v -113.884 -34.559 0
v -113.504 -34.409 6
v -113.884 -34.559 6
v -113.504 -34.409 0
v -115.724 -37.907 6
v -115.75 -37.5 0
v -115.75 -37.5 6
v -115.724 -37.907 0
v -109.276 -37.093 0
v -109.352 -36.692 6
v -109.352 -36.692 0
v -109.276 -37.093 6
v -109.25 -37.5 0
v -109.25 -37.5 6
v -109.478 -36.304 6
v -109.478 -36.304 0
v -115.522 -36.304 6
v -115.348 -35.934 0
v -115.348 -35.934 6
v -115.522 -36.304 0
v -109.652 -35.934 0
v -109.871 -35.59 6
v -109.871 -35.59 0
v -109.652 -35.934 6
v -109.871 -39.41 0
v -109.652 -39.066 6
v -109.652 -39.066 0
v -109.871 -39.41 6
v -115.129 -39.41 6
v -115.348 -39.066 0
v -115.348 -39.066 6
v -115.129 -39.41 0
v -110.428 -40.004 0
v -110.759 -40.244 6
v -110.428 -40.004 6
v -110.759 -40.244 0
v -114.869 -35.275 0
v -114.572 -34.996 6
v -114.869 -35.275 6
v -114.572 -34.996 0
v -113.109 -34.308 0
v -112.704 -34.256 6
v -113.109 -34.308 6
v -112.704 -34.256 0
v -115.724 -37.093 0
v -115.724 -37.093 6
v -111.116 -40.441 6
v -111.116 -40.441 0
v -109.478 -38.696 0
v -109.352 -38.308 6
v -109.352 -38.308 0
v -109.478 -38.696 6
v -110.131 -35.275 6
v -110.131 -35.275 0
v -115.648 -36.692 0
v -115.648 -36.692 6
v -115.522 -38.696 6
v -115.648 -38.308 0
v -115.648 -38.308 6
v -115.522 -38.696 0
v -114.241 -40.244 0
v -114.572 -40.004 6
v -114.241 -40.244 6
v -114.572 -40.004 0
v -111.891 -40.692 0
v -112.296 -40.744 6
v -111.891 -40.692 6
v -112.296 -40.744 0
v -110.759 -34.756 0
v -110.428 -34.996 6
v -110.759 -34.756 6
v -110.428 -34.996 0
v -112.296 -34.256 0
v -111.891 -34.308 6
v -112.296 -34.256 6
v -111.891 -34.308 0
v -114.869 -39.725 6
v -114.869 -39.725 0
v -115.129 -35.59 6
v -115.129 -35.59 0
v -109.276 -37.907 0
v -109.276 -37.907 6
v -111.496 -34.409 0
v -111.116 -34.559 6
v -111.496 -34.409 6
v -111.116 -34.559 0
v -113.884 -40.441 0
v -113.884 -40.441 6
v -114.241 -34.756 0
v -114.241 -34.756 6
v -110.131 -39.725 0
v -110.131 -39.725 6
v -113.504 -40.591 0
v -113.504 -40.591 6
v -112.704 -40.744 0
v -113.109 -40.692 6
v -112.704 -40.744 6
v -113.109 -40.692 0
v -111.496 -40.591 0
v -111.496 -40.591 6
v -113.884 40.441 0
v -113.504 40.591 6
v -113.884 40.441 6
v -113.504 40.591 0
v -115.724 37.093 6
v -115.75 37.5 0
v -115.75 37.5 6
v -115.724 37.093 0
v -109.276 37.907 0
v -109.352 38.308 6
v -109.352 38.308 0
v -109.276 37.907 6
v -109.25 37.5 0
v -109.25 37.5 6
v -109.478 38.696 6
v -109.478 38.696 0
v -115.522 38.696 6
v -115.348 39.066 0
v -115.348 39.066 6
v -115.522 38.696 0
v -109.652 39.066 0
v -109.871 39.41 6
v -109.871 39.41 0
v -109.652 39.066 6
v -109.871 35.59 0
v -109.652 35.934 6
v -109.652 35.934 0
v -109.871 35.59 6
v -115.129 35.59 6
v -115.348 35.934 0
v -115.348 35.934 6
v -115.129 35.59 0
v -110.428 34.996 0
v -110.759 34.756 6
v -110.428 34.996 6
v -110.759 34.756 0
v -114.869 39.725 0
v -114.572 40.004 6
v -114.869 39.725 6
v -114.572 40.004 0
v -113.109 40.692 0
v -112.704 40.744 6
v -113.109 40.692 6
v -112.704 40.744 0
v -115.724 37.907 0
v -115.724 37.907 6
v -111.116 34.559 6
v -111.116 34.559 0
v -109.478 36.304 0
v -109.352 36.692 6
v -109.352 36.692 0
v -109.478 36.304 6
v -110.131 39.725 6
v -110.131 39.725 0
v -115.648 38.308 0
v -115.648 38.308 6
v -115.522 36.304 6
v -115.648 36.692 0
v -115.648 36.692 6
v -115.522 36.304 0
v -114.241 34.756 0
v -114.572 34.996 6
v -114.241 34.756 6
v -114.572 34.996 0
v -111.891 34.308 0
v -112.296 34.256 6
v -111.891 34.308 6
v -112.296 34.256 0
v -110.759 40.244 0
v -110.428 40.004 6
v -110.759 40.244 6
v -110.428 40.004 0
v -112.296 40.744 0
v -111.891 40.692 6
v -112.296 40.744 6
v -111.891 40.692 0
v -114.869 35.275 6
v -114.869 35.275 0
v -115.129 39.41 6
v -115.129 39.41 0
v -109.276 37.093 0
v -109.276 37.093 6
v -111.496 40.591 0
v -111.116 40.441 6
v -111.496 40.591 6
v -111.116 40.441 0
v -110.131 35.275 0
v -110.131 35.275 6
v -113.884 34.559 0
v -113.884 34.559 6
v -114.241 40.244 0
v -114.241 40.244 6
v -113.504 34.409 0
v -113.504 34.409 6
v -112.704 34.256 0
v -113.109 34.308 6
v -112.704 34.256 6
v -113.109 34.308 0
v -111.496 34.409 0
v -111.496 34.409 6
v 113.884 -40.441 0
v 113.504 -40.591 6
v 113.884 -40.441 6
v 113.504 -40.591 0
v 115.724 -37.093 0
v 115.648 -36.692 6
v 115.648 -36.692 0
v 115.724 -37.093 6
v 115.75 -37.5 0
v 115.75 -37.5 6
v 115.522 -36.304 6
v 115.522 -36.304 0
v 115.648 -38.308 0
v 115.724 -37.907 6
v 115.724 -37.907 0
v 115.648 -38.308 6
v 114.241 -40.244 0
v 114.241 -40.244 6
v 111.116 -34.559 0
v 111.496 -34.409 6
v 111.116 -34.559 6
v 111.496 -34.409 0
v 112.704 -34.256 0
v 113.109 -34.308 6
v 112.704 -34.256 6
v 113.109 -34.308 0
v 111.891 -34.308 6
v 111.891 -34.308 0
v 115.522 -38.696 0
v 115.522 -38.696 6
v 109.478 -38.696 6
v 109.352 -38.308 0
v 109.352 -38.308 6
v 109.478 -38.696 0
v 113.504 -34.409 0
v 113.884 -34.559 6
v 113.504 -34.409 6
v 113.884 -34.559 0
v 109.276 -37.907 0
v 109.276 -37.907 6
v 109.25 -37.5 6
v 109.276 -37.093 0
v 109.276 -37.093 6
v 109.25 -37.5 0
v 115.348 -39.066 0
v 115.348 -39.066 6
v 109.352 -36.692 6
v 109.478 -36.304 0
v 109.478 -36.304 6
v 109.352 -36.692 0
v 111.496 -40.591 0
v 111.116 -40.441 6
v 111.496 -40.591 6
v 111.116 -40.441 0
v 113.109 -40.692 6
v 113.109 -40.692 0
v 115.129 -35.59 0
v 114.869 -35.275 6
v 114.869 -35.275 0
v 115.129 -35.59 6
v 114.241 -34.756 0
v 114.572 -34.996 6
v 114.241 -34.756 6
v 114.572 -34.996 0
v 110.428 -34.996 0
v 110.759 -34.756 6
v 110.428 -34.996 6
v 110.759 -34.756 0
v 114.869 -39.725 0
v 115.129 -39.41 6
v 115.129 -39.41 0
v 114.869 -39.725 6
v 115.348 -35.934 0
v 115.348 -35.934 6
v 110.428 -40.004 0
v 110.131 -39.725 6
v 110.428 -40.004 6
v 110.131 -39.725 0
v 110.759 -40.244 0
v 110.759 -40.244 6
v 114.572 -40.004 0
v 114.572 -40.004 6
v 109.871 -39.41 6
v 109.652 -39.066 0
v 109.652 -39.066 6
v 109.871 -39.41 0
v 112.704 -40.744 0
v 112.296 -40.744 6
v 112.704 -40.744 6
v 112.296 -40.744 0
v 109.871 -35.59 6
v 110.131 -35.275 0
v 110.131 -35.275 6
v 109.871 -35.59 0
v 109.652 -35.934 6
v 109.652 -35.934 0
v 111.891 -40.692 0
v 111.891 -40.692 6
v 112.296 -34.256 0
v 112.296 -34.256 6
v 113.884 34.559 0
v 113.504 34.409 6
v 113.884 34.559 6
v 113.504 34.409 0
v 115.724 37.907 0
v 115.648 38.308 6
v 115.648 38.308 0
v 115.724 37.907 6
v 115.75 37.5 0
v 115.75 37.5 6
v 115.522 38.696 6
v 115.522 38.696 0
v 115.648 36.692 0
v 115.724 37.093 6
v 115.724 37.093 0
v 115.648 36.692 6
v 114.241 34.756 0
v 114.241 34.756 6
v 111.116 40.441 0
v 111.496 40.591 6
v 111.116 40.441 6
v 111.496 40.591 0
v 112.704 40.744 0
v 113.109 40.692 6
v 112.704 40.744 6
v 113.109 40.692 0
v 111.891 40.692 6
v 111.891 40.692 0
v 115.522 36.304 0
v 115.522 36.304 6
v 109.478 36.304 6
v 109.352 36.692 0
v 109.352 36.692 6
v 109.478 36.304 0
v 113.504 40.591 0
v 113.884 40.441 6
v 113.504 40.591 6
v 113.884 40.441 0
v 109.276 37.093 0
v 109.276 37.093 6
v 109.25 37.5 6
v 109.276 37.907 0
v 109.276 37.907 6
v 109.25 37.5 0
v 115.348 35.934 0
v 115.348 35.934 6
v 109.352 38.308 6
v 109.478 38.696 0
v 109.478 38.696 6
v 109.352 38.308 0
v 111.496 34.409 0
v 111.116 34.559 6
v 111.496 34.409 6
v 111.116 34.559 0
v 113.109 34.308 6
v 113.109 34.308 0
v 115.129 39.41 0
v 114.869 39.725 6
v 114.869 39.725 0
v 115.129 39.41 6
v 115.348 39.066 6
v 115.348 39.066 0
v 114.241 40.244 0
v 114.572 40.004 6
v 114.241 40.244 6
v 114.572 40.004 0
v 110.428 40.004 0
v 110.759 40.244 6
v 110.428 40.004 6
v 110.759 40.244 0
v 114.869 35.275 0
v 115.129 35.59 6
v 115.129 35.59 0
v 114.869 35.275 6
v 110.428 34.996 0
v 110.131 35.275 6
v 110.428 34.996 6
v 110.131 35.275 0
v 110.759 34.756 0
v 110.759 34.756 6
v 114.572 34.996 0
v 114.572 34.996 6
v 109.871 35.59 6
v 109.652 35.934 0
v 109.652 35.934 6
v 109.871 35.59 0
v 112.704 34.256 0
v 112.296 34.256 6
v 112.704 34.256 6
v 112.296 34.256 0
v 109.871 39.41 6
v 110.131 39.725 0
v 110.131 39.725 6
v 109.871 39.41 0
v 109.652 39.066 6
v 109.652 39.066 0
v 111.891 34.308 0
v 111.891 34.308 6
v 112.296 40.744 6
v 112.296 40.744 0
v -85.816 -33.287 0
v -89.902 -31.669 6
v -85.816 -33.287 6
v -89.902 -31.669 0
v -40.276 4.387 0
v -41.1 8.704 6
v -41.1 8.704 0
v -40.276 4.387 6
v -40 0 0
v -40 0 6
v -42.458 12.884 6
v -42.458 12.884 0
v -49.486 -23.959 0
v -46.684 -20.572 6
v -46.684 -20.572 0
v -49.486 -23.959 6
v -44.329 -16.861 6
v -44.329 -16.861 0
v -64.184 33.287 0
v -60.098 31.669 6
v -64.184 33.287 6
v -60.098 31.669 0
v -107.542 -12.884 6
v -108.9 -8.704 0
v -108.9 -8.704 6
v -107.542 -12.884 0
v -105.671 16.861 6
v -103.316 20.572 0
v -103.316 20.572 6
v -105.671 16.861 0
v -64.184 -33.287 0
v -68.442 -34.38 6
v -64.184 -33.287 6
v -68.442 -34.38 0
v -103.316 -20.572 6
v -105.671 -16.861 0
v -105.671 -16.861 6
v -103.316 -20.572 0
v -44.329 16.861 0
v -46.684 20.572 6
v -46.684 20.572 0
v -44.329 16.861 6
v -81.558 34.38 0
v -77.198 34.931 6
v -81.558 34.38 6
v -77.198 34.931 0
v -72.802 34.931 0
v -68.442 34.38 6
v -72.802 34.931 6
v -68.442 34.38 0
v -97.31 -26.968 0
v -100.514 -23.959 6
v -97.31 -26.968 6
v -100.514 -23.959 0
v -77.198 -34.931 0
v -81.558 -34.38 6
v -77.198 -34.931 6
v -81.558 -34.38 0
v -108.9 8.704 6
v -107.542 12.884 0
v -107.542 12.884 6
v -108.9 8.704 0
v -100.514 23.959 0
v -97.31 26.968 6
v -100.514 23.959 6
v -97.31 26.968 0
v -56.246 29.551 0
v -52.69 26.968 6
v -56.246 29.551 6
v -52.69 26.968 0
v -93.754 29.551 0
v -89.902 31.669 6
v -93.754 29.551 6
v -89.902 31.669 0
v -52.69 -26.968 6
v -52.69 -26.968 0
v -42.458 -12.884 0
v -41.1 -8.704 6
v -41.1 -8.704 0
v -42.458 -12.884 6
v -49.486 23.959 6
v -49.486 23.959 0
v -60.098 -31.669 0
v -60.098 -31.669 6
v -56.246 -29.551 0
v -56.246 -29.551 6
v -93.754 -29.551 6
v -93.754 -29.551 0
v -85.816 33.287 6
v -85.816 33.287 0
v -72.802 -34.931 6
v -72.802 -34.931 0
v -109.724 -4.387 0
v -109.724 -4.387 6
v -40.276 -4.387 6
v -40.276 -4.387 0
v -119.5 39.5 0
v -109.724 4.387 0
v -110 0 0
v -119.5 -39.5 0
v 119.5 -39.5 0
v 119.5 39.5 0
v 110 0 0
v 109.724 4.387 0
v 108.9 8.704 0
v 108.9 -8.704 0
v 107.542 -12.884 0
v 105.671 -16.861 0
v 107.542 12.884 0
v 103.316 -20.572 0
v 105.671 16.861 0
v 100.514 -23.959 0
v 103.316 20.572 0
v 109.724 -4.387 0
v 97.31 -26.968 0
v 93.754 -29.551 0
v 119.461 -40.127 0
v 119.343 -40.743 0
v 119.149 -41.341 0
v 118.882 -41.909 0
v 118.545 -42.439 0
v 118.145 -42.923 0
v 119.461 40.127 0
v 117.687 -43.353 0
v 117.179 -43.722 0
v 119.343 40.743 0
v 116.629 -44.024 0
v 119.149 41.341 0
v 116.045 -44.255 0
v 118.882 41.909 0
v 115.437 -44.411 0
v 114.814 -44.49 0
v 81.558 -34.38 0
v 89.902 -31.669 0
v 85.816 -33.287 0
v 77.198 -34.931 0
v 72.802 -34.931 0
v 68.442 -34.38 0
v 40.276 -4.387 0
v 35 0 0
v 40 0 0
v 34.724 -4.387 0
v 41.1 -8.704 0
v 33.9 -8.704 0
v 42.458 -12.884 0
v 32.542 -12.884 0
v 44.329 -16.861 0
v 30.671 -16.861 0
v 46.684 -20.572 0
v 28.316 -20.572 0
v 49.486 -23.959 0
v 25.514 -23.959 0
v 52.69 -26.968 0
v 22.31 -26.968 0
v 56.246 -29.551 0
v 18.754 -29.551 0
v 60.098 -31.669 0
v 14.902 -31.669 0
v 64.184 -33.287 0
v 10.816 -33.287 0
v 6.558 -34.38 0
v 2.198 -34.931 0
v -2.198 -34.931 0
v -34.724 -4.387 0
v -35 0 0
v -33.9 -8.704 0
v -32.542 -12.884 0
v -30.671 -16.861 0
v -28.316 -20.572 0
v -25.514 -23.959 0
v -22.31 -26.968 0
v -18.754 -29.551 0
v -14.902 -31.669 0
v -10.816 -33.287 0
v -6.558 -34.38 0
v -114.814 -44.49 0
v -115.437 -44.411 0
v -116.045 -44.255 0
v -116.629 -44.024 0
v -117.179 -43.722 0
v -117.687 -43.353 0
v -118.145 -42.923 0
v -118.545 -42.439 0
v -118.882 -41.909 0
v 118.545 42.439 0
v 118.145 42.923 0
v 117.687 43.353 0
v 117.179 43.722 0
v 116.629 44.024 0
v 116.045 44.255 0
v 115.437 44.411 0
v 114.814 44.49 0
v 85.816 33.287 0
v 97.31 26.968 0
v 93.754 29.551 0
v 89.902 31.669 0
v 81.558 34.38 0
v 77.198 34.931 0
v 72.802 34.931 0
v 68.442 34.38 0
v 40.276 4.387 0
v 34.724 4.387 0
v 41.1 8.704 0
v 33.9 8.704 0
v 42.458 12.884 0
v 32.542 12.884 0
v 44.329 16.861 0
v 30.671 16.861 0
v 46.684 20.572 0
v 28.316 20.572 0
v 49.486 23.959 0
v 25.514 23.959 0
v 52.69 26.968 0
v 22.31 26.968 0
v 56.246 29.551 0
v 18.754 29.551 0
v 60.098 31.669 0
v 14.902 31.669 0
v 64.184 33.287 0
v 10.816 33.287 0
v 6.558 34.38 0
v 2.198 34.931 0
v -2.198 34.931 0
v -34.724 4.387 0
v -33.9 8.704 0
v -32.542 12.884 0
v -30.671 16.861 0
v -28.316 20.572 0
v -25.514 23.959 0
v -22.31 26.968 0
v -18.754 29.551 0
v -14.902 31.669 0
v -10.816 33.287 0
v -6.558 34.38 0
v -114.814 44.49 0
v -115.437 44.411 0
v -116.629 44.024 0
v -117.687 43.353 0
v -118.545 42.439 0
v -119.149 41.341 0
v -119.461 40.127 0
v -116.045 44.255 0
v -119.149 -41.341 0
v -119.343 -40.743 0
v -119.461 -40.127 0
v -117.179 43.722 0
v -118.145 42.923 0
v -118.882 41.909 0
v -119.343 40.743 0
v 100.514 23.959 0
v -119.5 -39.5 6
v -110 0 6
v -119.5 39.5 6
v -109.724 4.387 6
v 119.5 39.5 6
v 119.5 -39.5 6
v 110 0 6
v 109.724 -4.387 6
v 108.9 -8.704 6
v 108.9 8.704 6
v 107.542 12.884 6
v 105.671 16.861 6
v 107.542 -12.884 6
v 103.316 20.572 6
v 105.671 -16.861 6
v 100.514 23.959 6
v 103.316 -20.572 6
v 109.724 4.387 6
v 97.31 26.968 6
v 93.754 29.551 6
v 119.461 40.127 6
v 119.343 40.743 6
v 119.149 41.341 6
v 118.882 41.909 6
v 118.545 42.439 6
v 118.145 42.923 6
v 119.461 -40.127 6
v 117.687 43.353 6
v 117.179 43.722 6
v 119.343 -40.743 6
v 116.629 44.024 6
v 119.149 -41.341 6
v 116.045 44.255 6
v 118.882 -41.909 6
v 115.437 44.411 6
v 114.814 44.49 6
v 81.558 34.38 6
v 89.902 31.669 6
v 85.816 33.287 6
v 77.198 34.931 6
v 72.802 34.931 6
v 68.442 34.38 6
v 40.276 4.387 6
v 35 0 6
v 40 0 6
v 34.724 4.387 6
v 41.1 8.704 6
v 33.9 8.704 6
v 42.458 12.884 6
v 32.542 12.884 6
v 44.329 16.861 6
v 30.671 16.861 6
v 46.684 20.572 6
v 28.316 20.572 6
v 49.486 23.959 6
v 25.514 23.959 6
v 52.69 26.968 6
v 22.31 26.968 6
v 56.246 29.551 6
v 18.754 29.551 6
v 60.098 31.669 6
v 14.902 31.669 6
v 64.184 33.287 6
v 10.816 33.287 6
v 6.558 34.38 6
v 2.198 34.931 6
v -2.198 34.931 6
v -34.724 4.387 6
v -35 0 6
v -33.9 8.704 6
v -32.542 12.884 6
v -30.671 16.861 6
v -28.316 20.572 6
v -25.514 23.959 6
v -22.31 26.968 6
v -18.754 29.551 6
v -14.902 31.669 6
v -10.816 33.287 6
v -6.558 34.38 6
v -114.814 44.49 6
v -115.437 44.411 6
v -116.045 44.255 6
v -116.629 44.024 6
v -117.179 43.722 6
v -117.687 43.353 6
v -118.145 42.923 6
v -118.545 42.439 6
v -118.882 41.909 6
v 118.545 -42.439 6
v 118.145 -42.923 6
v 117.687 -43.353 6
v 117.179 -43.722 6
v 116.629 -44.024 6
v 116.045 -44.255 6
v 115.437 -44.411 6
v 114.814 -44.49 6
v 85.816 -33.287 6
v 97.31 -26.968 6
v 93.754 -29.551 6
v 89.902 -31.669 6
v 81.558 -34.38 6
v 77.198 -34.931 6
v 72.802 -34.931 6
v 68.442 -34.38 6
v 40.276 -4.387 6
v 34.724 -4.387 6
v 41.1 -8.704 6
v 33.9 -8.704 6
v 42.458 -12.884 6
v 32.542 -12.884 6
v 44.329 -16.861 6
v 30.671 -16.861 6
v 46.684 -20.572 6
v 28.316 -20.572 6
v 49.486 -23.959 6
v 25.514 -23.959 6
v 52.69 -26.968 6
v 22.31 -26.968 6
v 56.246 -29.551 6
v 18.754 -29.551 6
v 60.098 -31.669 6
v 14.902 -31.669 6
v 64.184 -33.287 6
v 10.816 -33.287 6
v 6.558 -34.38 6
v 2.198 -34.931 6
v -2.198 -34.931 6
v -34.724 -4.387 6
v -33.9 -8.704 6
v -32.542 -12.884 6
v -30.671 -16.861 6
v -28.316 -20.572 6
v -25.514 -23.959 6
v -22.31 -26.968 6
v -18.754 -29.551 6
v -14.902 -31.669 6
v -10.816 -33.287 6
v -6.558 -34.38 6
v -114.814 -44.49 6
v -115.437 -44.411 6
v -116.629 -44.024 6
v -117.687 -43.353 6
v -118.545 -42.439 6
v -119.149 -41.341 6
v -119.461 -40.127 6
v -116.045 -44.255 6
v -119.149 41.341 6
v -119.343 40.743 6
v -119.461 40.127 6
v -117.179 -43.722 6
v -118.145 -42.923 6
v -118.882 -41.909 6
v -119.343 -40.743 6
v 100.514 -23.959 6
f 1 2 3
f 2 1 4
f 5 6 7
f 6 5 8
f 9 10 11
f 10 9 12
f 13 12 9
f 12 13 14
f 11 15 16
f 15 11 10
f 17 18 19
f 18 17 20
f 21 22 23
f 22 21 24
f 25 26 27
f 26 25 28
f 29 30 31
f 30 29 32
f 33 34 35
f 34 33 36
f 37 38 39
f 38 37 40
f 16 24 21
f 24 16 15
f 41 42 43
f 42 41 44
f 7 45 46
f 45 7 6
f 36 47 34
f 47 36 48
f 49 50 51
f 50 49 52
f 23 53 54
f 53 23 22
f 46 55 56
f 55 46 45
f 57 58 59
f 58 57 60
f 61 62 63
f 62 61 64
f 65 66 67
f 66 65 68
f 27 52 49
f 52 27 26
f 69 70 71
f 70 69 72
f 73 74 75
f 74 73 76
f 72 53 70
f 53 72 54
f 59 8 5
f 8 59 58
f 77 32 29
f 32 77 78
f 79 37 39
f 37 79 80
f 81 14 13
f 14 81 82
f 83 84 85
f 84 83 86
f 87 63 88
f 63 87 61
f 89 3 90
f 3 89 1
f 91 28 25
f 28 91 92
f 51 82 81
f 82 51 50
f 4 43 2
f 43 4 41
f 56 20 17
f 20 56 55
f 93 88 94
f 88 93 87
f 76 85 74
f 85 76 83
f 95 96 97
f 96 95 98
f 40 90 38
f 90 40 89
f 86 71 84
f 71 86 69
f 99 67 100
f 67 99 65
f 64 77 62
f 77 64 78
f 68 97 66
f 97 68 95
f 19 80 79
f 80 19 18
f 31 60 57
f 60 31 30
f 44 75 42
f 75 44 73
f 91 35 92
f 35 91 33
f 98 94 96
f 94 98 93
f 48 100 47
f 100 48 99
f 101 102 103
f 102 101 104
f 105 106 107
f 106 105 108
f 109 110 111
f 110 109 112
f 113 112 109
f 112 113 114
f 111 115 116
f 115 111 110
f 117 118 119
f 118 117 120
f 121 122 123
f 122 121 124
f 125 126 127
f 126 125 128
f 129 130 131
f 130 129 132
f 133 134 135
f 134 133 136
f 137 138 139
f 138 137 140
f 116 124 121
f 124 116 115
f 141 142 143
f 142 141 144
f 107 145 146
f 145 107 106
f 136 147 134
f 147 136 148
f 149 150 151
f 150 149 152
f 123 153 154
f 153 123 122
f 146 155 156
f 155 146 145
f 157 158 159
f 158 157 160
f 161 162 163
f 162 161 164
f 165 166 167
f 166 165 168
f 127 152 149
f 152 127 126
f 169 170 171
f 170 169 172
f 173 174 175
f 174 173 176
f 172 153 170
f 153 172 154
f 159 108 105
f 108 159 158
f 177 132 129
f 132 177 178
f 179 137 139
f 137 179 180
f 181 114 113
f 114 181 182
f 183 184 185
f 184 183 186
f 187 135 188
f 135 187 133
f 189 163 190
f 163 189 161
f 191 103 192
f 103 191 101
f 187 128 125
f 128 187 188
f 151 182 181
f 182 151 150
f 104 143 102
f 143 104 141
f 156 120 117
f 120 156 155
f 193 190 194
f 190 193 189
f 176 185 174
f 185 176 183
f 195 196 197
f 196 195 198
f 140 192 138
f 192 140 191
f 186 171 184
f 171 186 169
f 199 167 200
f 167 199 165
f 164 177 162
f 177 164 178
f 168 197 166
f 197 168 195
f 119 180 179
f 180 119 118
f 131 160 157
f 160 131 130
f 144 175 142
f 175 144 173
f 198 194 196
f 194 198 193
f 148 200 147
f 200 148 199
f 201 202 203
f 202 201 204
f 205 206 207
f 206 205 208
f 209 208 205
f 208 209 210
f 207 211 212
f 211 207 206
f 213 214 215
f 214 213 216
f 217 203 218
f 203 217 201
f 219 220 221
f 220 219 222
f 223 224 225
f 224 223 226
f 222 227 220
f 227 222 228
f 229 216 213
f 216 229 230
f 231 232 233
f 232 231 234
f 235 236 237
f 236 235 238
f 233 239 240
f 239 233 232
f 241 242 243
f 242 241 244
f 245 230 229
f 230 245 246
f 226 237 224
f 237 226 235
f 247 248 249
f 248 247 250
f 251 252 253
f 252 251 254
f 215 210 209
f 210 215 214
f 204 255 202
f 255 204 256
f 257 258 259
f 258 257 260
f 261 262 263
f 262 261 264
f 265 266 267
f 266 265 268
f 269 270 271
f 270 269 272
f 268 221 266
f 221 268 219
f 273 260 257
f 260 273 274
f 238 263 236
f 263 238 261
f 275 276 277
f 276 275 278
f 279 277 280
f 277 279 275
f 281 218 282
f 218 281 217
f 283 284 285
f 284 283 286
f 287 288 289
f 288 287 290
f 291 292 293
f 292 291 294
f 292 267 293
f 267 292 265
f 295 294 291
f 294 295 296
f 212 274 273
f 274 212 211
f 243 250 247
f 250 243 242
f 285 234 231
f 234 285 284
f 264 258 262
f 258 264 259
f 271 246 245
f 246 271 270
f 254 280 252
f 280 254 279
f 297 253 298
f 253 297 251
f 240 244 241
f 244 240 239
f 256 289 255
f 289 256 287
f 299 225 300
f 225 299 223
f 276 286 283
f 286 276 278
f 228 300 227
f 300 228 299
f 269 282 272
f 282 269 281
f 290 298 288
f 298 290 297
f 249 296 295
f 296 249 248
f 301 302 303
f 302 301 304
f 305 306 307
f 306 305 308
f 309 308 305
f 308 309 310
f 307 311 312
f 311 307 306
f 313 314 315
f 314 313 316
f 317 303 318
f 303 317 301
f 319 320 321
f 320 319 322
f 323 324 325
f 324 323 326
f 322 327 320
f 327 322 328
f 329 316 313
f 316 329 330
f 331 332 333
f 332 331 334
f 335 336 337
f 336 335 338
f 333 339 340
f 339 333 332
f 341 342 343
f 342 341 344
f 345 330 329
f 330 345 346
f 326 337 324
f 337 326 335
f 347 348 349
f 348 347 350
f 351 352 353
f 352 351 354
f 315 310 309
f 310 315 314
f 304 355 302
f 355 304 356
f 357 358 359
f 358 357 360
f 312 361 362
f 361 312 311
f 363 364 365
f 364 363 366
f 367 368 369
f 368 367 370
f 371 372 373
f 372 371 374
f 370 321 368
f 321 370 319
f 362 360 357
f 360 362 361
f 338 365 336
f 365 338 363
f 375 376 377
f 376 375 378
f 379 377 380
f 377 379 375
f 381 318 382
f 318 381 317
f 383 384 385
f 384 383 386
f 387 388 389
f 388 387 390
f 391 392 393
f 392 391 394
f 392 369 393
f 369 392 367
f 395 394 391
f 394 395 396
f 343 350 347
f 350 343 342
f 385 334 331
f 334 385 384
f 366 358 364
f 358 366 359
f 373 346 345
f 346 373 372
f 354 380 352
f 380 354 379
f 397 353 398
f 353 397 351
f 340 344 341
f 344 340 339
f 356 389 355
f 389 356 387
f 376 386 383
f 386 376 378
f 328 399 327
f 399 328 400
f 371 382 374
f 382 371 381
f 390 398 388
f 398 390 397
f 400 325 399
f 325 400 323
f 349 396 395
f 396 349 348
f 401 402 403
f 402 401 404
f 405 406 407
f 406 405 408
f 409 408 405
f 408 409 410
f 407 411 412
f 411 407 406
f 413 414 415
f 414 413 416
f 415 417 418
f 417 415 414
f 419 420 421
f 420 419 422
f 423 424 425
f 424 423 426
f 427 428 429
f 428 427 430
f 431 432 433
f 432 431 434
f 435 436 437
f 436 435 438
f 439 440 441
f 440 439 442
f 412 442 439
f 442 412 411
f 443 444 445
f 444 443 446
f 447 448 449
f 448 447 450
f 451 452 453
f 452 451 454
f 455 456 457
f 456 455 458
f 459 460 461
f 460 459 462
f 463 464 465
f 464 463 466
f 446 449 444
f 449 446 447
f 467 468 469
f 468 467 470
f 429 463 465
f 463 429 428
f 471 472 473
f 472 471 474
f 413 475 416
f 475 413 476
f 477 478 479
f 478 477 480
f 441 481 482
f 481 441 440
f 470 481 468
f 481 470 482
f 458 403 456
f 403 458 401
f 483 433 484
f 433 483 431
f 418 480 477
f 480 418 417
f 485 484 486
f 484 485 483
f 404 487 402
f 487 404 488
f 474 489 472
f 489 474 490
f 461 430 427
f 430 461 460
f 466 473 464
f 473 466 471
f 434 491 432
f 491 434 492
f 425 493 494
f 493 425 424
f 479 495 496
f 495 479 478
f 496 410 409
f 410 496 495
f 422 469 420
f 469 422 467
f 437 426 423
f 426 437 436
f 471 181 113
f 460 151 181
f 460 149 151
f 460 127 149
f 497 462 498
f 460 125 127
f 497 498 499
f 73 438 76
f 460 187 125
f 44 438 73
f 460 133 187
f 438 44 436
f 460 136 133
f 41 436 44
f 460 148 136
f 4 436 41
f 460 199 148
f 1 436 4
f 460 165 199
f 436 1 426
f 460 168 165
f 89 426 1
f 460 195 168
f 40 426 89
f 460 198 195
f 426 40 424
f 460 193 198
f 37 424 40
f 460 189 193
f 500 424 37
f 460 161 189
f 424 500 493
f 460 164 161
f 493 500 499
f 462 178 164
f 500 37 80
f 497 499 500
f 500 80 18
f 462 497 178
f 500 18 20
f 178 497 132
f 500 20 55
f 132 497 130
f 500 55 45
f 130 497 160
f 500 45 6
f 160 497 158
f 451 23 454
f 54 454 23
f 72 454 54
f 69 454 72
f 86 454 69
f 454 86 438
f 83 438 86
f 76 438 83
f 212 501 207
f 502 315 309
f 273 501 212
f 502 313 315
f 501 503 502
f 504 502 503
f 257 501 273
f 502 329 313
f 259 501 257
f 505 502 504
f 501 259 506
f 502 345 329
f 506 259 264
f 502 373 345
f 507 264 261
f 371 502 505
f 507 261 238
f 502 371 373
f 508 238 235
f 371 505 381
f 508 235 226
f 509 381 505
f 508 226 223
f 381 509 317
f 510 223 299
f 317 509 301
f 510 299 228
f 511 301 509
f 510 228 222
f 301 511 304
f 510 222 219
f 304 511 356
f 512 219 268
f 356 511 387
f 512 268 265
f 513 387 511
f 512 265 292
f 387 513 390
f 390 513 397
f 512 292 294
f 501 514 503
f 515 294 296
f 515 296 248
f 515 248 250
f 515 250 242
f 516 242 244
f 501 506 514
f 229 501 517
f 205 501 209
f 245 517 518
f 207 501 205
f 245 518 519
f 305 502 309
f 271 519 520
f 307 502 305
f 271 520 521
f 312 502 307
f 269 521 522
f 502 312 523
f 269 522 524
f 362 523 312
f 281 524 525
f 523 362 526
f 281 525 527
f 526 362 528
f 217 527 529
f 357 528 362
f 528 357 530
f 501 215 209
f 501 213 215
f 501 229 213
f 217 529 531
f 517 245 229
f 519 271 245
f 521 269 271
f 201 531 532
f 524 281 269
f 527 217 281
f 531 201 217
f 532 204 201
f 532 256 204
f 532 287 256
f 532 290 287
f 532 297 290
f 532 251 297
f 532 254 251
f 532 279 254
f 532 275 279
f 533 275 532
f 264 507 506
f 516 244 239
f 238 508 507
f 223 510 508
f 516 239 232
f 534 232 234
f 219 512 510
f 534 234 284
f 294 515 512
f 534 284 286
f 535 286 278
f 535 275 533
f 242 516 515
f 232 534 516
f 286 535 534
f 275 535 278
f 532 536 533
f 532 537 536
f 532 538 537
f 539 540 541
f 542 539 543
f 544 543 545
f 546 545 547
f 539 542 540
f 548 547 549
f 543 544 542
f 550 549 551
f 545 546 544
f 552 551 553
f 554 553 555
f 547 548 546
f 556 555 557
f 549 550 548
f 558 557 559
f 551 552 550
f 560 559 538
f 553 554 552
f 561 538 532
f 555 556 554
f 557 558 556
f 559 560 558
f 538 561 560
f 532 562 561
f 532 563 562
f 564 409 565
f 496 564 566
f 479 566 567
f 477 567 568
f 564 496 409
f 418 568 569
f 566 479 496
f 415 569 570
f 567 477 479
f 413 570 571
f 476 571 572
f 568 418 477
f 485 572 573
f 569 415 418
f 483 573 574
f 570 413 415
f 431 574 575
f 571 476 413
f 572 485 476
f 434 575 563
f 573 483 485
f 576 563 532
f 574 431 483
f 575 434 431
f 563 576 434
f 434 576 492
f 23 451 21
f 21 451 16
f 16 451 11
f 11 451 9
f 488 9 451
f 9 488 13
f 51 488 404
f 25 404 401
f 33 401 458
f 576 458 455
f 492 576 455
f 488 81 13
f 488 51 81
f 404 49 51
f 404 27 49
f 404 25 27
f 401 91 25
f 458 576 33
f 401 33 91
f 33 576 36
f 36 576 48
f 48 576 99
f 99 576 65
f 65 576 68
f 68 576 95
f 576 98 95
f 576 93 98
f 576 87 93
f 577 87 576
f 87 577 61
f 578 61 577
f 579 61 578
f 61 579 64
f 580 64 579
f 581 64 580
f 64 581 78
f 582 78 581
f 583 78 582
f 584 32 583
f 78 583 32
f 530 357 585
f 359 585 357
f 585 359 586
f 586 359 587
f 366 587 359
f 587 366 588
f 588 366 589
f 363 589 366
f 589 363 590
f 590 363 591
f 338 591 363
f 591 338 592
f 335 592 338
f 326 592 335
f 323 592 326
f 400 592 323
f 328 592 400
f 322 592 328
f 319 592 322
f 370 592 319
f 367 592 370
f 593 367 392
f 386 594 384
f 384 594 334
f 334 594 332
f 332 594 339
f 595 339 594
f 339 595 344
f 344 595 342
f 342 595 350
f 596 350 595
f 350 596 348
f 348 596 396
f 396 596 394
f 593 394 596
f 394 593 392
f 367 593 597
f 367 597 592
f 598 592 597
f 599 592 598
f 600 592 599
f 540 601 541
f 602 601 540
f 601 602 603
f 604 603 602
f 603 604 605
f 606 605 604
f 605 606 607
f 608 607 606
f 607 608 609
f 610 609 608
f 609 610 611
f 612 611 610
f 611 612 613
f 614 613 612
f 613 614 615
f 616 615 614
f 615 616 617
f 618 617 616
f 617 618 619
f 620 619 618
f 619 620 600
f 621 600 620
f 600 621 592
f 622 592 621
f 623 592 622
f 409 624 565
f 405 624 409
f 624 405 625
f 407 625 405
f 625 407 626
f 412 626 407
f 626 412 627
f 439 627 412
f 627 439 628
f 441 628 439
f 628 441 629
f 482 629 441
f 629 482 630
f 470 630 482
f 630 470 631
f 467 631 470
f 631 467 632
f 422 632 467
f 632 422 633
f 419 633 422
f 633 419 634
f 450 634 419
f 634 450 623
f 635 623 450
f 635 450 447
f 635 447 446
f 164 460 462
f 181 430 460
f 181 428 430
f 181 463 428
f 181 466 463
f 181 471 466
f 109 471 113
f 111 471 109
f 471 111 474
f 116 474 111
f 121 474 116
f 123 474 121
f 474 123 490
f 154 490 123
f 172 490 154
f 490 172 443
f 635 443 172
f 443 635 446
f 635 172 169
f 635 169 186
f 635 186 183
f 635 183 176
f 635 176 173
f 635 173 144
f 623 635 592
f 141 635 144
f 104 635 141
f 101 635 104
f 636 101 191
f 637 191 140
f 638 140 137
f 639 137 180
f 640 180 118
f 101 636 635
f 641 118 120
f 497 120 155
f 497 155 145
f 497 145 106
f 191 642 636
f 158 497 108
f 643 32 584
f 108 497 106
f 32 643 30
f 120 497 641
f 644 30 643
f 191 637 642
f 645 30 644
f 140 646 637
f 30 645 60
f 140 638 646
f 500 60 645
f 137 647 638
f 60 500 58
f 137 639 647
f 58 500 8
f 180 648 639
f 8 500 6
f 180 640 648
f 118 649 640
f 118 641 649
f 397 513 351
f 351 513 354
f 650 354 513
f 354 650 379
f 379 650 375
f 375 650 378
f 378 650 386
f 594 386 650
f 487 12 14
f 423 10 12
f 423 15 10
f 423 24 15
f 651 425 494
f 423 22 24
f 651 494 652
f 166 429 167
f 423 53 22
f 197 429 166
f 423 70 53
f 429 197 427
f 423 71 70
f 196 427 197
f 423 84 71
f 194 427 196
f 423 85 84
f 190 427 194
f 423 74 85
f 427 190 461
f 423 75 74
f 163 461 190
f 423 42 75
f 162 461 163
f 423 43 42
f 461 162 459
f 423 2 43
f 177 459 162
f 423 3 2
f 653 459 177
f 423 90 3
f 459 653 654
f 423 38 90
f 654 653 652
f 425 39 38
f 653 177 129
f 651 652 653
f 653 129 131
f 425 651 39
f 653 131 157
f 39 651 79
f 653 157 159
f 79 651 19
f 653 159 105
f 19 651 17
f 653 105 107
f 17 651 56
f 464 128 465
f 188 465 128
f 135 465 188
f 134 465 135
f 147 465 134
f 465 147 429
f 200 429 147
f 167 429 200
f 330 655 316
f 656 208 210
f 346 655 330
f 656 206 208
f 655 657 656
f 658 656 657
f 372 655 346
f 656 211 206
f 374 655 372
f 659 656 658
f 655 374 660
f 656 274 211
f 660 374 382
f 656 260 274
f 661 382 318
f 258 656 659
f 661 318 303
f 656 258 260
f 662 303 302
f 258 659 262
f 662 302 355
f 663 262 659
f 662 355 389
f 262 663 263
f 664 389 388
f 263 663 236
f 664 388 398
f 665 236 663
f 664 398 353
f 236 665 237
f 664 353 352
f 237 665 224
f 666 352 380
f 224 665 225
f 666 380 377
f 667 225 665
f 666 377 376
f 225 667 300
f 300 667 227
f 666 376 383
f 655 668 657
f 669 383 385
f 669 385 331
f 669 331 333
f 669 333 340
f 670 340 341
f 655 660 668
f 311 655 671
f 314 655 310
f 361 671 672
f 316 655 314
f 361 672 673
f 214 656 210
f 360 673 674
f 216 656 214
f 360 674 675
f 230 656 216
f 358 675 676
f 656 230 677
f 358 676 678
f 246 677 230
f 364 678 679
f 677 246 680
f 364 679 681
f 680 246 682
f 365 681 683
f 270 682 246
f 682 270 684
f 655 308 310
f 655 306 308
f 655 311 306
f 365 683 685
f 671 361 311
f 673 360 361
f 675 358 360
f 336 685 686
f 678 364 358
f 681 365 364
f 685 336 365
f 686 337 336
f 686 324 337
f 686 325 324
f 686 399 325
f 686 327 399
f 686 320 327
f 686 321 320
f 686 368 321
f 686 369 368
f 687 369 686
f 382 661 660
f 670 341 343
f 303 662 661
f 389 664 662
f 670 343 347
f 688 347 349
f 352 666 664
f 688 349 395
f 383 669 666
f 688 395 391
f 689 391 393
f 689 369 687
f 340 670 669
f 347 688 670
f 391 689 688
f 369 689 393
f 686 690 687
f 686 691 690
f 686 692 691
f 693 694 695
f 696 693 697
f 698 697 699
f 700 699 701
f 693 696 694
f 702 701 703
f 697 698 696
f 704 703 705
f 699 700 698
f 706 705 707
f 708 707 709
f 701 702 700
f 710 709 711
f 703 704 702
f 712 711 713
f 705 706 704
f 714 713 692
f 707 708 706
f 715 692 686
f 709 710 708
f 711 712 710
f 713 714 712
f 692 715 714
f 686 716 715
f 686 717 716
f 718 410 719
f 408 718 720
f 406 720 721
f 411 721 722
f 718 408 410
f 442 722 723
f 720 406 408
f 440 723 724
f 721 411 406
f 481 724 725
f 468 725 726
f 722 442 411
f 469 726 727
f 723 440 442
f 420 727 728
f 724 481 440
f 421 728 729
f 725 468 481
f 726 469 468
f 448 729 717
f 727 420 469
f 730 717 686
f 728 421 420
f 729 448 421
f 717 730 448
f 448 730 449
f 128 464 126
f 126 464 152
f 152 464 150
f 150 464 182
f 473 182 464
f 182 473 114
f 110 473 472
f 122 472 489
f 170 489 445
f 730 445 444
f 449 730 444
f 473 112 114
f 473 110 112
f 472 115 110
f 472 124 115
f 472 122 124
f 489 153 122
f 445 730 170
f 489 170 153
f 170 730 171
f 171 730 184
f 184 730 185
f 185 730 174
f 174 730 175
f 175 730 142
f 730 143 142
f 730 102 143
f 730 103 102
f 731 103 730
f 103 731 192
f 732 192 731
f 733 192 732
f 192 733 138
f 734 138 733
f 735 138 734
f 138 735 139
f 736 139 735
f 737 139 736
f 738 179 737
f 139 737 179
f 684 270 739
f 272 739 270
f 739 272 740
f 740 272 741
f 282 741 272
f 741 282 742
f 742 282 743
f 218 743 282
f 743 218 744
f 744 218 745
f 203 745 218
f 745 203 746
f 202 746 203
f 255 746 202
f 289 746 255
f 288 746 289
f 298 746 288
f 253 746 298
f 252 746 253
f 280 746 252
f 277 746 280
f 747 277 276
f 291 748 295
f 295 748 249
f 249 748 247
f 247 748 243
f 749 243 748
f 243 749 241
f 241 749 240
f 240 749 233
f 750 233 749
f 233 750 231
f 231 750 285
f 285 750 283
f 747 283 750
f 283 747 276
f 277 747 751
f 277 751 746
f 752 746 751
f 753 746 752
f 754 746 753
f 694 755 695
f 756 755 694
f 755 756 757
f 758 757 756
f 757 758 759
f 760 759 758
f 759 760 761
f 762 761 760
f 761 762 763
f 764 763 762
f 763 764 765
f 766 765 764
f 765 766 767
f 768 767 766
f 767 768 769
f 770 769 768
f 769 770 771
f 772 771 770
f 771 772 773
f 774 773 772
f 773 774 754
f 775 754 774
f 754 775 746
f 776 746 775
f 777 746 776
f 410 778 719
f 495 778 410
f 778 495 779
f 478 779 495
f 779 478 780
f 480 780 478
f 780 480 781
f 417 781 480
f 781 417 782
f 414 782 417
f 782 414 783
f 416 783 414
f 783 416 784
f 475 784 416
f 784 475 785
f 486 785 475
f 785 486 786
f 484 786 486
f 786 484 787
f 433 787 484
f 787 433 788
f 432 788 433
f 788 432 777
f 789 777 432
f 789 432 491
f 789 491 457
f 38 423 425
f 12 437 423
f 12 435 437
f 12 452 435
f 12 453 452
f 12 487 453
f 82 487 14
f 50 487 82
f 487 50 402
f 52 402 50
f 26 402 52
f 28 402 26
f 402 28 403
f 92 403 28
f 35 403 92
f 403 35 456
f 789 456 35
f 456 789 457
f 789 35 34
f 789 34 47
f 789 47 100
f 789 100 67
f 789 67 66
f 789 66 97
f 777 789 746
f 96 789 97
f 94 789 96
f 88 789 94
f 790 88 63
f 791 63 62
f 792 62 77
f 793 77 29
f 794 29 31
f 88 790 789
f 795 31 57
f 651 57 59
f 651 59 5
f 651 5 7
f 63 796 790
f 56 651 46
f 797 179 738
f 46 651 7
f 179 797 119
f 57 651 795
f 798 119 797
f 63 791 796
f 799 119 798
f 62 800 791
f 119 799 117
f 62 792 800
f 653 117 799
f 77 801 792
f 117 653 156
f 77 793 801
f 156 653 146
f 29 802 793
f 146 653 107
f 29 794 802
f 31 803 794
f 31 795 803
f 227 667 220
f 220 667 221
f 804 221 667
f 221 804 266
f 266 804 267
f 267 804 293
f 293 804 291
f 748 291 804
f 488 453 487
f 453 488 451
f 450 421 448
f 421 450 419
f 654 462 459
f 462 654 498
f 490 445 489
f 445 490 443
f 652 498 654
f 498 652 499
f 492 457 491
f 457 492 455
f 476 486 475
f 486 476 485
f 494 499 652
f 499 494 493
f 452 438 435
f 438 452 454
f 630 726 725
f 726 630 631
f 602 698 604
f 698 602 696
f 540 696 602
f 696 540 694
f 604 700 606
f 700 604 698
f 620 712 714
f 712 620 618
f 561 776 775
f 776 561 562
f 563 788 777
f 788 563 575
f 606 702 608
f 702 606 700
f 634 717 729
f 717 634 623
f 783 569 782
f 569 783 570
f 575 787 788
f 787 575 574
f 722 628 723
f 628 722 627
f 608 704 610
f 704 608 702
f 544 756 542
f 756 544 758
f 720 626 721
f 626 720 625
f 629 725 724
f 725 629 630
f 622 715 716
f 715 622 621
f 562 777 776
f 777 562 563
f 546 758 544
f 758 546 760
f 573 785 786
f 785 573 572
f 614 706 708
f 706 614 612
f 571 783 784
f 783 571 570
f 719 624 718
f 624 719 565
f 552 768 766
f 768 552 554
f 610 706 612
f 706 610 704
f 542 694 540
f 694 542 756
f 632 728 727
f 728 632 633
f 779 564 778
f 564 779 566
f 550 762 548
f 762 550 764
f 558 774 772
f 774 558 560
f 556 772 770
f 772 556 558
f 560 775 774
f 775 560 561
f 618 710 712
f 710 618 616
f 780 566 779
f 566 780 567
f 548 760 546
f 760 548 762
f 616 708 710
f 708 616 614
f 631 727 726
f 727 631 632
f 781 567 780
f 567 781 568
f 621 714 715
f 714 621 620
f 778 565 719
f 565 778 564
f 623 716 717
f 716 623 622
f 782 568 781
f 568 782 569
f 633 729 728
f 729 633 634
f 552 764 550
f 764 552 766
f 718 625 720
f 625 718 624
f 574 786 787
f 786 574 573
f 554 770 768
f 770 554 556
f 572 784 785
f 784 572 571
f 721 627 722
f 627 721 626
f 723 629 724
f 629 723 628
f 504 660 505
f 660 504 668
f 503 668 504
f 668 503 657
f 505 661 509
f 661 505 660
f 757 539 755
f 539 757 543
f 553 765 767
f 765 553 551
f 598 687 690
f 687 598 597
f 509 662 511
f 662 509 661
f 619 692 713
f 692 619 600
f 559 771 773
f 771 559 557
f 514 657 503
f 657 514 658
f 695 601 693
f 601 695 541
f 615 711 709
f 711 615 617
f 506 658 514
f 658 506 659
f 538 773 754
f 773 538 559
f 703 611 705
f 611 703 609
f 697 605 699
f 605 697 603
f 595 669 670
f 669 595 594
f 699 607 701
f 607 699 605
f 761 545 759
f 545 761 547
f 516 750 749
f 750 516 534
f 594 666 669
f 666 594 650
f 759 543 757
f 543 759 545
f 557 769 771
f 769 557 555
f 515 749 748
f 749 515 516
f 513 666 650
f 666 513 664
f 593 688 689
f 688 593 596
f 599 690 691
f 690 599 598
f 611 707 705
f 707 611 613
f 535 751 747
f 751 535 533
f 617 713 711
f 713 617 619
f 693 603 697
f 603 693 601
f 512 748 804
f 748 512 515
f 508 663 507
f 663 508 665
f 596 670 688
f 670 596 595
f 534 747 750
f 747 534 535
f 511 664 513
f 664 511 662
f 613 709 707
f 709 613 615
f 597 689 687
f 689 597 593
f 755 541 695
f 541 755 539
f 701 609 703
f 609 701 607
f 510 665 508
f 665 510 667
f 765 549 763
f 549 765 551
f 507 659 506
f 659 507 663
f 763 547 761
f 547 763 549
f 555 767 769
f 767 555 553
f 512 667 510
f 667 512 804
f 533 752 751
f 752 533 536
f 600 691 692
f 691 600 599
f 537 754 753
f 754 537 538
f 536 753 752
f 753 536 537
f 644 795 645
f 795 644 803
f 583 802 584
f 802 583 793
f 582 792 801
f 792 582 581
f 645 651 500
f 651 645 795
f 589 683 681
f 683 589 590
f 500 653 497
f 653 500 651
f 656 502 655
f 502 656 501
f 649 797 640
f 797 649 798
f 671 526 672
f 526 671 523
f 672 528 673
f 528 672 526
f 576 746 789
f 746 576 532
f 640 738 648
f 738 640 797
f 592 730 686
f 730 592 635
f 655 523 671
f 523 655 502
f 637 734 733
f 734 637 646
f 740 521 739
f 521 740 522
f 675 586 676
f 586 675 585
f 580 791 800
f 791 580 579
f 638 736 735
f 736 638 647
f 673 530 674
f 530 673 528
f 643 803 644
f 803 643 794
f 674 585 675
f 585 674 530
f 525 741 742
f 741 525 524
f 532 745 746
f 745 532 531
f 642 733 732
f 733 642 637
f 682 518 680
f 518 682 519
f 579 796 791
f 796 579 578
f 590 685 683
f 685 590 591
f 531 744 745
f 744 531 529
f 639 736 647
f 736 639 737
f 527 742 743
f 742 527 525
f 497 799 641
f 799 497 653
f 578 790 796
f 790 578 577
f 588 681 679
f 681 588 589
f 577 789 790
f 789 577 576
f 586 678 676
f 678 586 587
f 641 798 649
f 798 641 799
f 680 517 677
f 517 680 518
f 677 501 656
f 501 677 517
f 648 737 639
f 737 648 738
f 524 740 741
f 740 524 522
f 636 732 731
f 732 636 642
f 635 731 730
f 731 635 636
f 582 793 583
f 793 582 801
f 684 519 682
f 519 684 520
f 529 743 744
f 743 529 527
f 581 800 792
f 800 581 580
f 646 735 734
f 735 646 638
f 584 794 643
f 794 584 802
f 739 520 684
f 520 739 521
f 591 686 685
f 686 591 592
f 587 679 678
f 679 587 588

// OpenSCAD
$fn = 50;


difference() {
	union() {
		hull() {
			translate(v = [-114.5000000000, 39.5000000000, 0]) {
				cylinder(h = 6, r = 5);
			}
			translate(v = [114.5000000000, 39.5000000000, 0]) {
				cylinder(h = 6, r = 5);
			}
			translate(v = [-114.5000000000, -39.5000000000, 0]) {
				cylinder(h = 6, r = 5);
			}
			translate(v = [114.5000000000, -39.5000000000, 0]) {
				cylinder(h = 6, r = 5);
			}
		}
	}
	union() {
		#translate(v = [-112.5000000000, -37.5000000000, -100.0000000000]) {
			cylinder(h = 200, r = 3.2500000000);
		}
		#translate(v = [-112.5000000000, 37.5000000000, -100.0000000000]) {
			cylinder(h = 200, r = 3.2500000000);
		}
		#translate(v = [112.5000000000, -37.5000000000, -100.0000000000]) {
			cylinder(h = 200, r = 3.2500000000);
		}
		#translate(v = [112.5000000000, 37.5000000000, -100.0000000000]) {
			cylinder(h = 200, r = 3.2500000000);
		}
		#translate(v = [-75.0000000000, 0, 0]) {
			cylinder(h = 6, r = 35.0000000000);
		}
		#cylinder(h = 6, r = 35.0000000000);
		#translate(v = [75.0000000000, 0, 0]) {
			cylinder(h = 6, r = 35.0000000000);
		}
	}
}
